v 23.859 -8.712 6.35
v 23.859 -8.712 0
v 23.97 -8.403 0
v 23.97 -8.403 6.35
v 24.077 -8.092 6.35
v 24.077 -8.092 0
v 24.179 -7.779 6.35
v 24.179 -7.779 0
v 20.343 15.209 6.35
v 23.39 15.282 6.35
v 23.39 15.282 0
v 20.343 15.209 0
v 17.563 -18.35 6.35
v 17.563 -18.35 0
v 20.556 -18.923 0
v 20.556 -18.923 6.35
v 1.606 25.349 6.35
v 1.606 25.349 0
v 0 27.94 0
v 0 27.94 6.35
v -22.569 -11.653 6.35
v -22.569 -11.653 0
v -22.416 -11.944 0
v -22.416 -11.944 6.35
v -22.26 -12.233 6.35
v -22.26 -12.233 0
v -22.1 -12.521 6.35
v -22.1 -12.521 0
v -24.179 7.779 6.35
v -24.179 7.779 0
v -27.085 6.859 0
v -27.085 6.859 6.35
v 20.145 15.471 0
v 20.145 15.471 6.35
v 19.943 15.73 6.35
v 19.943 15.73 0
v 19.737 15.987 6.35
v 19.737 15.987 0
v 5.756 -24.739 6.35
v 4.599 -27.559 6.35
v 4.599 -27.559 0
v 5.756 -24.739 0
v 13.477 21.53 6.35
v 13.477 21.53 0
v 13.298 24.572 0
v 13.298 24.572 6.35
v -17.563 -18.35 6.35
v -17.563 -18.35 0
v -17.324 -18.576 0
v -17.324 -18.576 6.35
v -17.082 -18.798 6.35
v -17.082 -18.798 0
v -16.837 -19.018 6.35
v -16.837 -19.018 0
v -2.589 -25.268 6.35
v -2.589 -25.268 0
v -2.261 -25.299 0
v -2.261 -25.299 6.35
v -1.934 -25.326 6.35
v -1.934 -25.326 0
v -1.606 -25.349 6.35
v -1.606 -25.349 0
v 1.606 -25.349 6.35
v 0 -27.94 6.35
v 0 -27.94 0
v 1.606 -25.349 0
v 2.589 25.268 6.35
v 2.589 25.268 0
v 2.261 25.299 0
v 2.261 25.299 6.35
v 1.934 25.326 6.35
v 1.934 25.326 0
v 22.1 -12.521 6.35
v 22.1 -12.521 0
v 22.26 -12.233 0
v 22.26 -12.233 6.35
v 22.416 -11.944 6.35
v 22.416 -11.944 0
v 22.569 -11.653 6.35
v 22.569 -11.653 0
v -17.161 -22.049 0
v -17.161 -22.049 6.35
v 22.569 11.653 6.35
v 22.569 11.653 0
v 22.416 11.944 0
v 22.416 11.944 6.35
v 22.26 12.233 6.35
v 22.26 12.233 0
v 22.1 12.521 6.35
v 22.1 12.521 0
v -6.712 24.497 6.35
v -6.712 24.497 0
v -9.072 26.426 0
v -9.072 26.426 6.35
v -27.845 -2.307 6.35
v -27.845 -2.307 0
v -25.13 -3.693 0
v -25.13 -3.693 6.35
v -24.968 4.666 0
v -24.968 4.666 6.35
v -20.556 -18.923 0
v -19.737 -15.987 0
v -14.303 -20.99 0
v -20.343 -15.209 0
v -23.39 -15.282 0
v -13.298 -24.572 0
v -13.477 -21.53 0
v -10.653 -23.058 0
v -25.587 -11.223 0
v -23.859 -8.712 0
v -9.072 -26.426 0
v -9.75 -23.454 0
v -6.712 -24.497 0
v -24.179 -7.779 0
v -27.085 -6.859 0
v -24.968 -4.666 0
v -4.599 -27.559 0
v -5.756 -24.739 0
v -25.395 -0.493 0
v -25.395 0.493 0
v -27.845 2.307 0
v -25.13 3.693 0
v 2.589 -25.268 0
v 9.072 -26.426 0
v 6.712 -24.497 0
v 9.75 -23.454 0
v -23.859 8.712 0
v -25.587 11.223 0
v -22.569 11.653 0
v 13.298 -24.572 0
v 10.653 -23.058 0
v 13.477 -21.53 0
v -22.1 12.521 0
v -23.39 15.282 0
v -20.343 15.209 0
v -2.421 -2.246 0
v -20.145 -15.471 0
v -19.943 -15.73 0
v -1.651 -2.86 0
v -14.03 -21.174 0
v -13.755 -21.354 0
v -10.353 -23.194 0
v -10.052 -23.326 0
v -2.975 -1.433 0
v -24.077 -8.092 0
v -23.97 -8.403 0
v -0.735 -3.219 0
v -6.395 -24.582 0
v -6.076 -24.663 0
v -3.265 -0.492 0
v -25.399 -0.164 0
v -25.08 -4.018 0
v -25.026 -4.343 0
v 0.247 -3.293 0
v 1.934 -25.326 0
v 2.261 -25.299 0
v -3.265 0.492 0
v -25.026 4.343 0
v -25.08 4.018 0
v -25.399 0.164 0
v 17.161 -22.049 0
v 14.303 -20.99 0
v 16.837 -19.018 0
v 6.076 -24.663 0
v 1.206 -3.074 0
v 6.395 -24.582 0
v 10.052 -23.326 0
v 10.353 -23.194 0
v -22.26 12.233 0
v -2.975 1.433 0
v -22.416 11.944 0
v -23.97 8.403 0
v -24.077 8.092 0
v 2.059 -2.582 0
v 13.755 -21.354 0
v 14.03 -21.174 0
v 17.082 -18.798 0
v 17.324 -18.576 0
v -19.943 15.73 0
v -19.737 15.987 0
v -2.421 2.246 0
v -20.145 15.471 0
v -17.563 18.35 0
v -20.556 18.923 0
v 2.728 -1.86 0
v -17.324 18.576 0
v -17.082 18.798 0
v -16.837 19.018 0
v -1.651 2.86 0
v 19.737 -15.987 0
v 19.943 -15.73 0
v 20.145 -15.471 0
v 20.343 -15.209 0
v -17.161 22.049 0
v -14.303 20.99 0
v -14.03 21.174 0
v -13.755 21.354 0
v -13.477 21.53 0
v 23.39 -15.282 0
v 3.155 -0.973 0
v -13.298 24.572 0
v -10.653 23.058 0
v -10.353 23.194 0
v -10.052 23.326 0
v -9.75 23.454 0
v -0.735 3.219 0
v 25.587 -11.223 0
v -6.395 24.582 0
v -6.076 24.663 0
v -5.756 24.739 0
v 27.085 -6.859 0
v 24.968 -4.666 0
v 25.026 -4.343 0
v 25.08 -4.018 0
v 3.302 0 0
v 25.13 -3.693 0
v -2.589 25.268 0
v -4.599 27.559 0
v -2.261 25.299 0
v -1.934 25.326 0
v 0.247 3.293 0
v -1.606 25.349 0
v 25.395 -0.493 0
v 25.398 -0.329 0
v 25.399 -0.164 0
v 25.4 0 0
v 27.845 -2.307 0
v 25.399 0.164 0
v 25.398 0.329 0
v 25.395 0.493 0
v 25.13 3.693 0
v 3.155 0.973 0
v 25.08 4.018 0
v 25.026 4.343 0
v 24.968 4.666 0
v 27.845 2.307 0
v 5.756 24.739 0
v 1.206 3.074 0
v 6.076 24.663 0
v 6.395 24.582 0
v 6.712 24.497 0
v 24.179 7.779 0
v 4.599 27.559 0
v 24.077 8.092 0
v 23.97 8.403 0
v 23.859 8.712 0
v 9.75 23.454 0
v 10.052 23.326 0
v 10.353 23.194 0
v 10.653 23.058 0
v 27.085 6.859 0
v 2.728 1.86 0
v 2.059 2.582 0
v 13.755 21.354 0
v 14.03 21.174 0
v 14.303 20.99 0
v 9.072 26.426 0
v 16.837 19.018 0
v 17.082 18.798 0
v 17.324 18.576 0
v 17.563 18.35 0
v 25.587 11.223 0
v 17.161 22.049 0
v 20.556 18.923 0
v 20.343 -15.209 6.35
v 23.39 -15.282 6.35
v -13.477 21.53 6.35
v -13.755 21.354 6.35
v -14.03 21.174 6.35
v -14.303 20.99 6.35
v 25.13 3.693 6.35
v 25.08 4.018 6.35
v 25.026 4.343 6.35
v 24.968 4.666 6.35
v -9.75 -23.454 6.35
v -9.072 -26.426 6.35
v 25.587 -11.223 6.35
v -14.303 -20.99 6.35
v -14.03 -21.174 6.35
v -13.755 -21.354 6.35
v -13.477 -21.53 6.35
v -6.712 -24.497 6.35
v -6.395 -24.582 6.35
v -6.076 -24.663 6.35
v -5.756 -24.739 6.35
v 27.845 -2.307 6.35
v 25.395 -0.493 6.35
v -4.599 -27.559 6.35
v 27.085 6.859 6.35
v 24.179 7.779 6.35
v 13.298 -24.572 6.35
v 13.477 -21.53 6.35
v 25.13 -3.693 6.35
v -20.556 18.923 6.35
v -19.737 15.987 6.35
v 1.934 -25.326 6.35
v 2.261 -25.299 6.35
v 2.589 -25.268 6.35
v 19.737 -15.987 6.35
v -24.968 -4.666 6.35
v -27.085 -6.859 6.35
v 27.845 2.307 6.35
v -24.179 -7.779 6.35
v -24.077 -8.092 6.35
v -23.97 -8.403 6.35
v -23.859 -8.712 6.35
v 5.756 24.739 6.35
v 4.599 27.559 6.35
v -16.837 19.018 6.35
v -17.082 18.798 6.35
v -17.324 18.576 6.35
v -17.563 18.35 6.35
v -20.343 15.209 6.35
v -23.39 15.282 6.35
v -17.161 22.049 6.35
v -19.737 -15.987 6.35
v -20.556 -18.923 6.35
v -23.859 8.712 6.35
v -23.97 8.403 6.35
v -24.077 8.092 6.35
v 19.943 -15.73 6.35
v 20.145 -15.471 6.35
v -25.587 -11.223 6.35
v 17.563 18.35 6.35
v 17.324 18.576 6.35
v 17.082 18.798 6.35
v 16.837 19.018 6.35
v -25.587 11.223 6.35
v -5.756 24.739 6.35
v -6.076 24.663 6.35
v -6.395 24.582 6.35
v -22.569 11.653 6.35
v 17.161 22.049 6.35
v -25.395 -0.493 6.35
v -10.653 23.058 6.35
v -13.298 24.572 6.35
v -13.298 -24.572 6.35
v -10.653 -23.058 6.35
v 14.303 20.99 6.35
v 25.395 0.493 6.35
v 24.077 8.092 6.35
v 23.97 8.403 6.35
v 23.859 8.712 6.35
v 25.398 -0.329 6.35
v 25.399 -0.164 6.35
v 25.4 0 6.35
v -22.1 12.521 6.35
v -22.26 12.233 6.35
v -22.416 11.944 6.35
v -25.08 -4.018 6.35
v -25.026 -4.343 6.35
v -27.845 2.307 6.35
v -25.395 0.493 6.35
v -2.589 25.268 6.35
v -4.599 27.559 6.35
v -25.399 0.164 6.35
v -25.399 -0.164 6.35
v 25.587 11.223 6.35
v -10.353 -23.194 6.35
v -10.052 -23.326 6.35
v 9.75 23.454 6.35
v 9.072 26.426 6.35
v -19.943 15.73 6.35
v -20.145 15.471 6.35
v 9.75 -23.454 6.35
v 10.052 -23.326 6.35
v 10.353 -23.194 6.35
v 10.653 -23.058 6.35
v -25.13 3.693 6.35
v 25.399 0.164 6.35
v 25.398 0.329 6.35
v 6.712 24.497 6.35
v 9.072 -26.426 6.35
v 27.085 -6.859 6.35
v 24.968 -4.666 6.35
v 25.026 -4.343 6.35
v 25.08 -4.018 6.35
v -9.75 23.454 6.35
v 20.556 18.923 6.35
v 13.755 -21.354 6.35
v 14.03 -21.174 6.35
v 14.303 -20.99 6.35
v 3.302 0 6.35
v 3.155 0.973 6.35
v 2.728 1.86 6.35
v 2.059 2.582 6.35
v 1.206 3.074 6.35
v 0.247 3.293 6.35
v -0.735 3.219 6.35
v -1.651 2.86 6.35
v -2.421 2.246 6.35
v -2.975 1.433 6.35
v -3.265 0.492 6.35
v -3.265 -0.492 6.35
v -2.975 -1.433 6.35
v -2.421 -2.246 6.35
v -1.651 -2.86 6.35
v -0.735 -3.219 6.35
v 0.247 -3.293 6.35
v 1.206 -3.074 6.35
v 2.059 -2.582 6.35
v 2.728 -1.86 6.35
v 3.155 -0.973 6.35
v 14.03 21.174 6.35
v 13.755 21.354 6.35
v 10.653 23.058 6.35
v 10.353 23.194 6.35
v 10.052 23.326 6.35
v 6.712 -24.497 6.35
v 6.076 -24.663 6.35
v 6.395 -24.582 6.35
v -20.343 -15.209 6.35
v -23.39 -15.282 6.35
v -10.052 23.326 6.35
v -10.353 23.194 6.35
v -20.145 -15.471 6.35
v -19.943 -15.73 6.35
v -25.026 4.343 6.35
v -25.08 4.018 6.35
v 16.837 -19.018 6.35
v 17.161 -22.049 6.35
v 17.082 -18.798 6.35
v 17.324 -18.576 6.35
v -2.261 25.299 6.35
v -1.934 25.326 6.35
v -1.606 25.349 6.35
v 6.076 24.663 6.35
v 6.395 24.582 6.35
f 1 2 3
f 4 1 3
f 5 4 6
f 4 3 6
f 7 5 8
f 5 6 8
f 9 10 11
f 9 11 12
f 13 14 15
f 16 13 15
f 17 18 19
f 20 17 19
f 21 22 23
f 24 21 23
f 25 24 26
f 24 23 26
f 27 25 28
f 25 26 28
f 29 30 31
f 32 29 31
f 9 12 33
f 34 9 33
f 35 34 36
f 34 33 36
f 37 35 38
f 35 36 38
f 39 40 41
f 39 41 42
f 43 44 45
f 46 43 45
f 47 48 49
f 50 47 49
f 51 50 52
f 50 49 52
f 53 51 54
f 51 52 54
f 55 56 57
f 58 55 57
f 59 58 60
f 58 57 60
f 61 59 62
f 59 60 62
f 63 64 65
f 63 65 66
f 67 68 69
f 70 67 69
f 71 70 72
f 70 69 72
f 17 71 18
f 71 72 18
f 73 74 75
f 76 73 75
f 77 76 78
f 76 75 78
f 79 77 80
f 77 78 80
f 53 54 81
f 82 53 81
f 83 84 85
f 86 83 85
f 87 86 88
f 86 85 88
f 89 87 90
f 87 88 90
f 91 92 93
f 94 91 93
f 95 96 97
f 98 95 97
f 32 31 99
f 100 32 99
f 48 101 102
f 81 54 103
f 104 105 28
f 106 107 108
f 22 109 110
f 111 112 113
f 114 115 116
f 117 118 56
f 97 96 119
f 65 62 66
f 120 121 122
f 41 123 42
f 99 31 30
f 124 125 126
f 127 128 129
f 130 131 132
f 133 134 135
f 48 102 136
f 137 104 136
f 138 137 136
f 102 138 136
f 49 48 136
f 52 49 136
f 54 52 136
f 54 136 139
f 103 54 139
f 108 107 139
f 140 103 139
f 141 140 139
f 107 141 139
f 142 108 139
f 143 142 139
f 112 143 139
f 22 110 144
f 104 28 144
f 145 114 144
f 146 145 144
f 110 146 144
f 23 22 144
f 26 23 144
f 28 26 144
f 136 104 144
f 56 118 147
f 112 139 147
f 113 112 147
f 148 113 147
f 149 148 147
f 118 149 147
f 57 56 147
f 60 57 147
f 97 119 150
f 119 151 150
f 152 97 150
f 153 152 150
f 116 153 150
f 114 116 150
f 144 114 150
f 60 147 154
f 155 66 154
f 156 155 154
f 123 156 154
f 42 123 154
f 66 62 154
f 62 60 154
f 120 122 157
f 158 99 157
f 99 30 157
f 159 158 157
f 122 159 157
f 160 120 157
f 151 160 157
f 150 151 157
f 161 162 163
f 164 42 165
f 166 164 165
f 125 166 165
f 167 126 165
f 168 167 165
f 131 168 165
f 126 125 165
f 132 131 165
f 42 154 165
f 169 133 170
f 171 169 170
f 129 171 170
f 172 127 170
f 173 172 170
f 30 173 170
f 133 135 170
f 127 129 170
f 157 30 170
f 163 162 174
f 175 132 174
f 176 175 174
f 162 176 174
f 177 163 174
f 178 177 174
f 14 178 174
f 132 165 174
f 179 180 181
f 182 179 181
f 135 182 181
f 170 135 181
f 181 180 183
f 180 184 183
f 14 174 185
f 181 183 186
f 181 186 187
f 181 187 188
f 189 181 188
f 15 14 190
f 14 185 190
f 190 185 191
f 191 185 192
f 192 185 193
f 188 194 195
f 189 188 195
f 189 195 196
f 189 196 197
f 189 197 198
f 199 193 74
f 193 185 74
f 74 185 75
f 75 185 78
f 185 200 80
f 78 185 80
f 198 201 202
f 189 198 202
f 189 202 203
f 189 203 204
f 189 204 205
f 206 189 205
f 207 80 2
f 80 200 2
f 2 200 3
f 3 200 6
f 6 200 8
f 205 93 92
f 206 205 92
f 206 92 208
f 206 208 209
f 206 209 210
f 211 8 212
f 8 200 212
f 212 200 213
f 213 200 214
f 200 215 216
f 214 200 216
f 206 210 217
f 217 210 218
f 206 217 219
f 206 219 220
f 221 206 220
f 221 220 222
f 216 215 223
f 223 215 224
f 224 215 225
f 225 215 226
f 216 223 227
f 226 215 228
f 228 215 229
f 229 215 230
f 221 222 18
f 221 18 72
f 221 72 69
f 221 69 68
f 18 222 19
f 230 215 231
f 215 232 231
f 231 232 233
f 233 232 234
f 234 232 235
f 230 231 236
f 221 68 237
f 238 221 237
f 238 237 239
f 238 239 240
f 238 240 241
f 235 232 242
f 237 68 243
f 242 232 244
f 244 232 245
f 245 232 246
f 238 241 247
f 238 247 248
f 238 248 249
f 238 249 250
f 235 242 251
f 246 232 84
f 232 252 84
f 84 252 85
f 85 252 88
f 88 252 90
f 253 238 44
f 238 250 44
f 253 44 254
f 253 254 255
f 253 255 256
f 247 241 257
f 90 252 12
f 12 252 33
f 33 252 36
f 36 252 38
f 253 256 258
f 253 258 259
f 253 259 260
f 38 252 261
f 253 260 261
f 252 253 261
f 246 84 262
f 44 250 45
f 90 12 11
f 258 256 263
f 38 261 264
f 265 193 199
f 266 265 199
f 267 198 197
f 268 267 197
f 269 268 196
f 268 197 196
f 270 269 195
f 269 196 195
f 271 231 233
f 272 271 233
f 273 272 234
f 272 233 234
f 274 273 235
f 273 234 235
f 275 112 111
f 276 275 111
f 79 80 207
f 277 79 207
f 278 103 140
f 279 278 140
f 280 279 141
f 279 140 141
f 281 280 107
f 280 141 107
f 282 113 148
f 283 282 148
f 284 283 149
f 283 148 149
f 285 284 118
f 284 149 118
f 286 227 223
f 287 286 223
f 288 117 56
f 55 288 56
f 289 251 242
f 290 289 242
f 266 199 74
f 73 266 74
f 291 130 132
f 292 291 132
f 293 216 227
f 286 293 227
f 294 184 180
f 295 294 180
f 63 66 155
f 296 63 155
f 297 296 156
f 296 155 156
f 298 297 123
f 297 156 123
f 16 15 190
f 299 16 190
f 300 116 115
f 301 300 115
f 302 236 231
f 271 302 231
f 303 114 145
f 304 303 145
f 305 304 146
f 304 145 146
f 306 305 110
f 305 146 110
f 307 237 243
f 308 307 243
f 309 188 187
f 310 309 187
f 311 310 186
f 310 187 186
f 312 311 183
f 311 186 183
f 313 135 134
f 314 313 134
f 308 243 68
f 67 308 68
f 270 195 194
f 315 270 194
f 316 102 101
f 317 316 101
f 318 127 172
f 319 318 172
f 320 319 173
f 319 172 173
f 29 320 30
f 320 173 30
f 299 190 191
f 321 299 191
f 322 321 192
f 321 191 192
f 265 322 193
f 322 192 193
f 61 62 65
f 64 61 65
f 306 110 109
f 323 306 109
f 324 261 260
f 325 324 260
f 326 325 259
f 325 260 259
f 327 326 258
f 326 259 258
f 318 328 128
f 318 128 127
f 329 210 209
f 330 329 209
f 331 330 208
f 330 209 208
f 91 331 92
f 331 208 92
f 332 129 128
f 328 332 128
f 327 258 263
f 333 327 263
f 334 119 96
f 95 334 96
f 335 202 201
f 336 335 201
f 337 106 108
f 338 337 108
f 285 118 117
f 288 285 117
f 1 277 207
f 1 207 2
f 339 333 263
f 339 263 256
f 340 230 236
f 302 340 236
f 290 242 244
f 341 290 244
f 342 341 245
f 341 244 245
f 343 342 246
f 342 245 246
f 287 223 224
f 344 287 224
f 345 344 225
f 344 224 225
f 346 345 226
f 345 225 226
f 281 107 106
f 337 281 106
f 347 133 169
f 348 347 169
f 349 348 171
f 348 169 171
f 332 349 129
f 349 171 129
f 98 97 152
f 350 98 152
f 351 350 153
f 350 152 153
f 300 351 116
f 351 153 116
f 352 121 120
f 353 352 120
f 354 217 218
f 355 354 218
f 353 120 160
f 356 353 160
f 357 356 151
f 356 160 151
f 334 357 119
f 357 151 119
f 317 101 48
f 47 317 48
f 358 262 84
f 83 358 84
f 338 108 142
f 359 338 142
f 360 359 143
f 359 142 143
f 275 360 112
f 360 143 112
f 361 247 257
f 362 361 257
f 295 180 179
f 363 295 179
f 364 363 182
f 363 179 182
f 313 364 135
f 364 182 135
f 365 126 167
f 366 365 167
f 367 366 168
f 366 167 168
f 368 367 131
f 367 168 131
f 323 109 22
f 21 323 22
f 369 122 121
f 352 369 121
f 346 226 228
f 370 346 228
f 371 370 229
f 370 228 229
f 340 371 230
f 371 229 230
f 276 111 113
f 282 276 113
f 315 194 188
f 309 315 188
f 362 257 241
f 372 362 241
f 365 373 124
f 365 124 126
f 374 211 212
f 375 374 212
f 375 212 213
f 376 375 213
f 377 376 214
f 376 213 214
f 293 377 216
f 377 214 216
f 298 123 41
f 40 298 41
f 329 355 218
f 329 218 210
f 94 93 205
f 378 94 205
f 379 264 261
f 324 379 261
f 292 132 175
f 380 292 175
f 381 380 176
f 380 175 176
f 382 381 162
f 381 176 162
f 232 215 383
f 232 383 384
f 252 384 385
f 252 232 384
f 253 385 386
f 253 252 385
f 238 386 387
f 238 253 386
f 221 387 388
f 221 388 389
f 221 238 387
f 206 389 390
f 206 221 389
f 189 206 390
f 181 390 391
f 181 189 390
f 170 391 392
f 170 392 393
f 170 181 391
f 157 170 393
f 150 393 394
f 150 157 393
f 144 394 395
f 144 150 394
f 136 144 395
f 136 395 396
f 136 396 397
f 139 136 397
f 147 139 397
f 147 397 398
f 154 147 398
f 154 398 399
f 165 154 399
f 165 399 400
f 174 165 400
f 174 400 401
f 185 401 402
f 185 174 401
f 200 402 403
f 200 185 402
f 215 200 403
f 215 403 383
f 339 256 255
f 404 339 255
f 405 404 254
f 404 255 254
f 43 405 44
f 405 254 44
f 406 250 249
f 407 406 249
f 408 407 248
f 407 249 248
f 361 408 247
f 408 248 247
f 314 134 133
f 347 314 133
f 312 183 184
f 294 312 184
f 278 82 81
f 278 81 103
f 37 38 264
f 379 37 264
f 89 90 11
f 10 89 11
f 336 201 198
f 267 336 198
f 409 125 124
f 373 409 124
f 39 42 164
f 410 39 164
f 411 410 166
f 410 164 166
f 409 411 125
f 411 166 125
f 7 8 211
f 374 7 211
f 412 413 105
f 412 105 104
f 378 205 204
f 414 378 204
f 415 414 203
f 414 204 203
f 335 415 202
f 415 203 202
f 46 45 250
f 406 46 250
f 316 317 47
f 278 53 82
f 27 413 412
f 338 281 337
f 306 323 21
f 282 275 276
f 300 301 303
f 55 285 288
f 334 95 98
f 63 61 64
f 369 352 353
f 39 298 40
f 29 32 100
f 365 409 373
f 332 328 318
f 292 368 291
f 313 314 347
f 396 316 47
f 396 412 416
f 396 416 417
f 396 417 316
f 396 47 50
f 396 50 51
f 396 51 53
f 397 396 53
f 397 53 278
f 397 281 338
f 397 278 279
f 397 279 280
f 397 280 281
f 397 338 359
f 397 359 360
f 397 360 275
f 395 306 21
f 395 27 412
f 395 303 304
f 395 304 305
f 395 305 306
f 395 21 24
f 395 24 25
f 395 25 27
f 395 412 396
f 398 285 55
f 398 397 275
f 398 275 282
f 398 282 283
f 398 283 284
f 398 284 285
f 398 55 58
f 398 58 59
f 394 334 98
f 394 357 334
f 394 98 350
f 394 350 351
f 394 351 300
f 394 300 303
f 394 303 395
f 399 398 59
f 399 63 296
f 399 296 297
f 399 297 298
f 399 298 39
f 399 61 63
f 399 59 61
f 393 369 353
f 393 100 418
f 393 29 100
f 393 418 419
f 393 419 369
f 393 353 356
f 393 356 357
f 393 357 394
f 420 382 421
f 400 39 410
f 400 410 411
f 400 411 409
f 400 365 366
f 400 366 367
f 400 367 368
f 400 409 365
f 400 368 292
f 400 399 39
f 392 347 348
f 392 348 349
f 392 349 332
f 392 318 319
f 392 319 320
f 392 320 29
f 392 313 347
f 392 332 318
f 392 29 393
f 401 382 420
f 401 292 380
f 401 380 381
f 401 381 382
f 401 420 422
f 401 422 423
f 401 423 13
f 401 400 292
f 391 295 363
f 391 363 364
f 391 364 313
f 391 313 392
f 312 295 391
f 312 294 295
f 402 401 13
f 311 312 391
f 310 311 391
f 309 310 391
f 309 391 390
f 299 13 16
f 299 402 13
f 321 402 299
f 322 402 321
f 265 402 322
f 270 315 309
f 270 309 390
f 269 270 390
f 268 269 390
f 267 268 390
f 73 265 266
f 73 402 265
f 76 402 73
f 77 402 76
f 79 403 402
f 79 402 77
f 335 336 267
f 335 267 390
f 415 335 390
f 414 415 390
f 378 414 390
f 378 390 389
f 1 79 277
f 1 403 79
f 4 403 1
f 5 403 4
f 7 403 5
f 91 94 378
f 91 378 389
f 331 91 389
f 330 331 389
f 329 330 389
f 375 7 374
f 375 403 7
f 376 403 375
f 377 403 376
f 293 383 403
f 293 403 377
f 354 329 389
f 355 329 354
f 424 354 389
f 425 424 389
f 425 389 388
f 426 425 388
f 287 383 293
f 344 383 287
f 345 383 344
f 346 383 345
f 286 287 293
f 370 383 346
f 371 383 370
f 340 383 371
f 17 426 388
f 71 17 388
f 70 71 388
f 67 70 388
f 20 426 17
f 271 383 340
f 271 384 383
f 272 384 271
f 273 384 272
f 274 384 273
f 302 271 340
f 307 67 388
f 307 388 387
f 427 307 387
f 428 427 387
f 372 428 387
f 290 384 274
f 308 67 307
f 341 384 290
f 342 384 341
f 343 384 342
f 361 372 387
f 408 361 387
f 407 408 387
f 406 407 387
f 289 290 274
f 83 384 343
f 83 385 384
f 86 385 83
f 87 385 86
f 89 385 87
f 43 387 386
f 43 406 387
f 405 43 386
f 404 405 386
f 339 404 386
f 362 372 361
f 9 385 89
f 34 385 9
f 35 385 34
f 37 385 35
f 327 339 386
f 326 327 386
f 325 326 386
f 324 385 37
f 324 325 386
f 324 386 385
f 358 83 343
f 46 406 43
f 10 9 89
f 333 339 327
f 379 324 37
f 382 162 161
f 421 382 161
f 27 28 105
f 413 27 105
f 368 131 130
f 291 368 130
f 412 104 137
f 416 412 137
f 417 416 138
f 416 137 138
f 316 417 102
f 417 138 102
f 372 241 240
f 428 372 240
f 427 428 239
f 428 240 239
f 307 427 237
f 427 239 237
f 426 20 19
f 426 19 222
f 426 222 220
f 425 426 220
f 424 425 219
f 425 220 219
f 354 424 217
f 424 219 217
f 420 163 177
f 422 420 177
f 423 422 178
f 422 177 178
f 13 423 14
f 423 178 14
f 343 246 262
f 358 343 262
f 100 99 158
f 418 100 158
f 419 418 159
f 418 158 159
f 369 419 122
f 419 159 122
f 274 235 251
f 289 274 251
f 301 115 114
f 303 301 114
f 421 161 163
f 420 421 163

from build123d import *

# Parameters (mm, degrees)
F0_R     = 3.302
F1_DEPTH = 6.35


with BuildPart() as f1:
    # F0 (on Top) → F1 (new body)
    with BuildSketch(Plane.XY):
        with BuildLine():
            ThreePointArc((2.588606, 25.267749), (4.180703, 25.053577), (5.756076, 24.739191))
            Line((5.756076, 24.739191), (4.598773, 27.558935))
            Line((4.598773, 27.558935), (2.588606, 25.267749))
        make_face()
        with BuildLine():
            ThreePointArc((6.712236, 24.497059), (8.247367, 24.023758), (9.749508, 23.454362))
            Line((9.749508, 23.454362), (9.072103, 26.426134))
            Line((9.072103, 26.426134), (6.712236, 24.497059))
        make_face()
        with BuildLine():
            ThreePointArc((10.652773, 23.058153), (12.089064, 22.338633), (13.476998, 21.529759))
            Line((13.476998, 21.529759), (13.29797, 24.572497))
            Line((13.29797, 24.572497), (10.652773, 23.058153))
        make_face()
        with BuildLine():
            ThreePointArc((14.30273, 20.990281), (15.601003, 20.044169), (16.836871, 19.01788))
            Line((16.836871, 19.01788), (17.161103, 22.048586))
            Line((17.161103, 22.048586), (14.30273, 20.990281))
        make_face()
        with BuildLine():
            ThreePointArc((17.562546, 18.349849), (18.687387, 17.202952), (19.737479, 15.987243))
            Line((19.737479, 15.987243), (20.556126, 18.923247))
            Line((20.556126, 18.923247), (17.562546, 18.349849))
        make_face()
        with BuildLine():
            ThreePointArc((20.343302, 15.208881), (21.264029, 13.892483), (22.099699, 12.520516))
            Line((22.099699, 12.520516), (23.390431, 15.281732))
            Line((23.390431, 15.281732), (20.343302, 15.208881))
        make_face()
        with BuildLine():
            ThreePointArc((22.569146, 11.653054), (23.260642, 10.203064), (23.859097, 8.712261))
            Line((23.859097, 8.712261), (25.586707, 11.22337))
            Line((25.586707, 11.22337), (22.569146, 11.653054))
        make_face()
        with BuildLine():
            ThreePointArc((24.179361, 7.779362), (24.622767, 6.235331), (24.967681, 4.666359))
            Line((24.967681, 4.666359), (27.085043, 6.858865))
            Line((27.085043, 6.858865), (24.179361, 7.779362))
        make_face()
        with BuildLine():
            ThreePointArc((25.130027, 3.69347), (25.313246, 2.097515), (25.395212, 0.493171))
            Line((25.395212, 0.493171), (27.844571, 2.307267))
            Line((27.844571, 2.307267), (25.130027, 3.69347))
        make_face()
        with BuildLine():
            Line((27.844571, -2.307267), (25.395212, -0.493171))
            ThreePointArc((25.395212, -0.493171), (25.313246, -2.097515), (25.130027, -3.69347))
            Line((25.130027, -3.69347), (27.844571, -2.307267))
        make_face()
        with BuildLine():
            Line((27.085043, -6.858865), (24.967681, -4.666359))
            ThreePointArc((24.967681, -4.666359), (24.622767, -6.235331), (24.179361, -7.779362))
            Line((24.179361, -7.779362), (27.085043, -6.858865))
        make_face()
        with BuildLine():
            Line((25.586707, -11.22337), (23.859097, -8.712261))
            ThreePointArc((23.859097, -8.712261), (23.260642, -10.203064), (22.569146, -11.653054))
            Line((22.569146, -11.653054), (25.586707, -11.22337))
        make_face()
        with BuildLine():
            Line((23.390431, -15.281732), (22.099699, -12.520516))
            ThreePointArc((22.099699, -12.520516), (21.264029, -13.892483), (20.343302, -15.208881))
            Line((20.343302, -15.208881), (23.390431, -15.281732))
        make_face()
        with BuildLine():
            Line((20.556126, -18.923247), (19.737479, -15.987243))
            ThreePointArc((19.737479, -15.987243), (18.687387, -17.202952), (17.562546, -18.349849))
            Line((17.562546, -18.349849), (20.556126, -18.923247))
        make_face()
        with BuildLine():
            Line((17.161103, -22.048586), (16.836871, -19.01788))
            ThreePointArc((16.836871, -19.01788), (15.601003, -20.044169), (14.30273, -20.990281))
            Line((14.30273, -20.990281), (17.161103, -22.048586))
        make_face()
        with BuildLine():
            Line((13.29797, -24.572497), (13.476998, -21.529759))
            ThreePointArc((13.476998, -21.529759), (12.089064, -22.338633), (10.652773, -23.058153))
            Line((10.652773, -23.058153), (13.29797, -24.572497))
        make_face()
        with BuildLine():
            Line((9.072103, -26.426134), (9.749508, -23.454362))
            ThreePointArc((9.749508, -23.454362), (8.247367, -24.023758), (6.712236, -24.497059))
            Line((6.712236, -24.497059), (9.072103, -26.426134))
        make_face()
        with BuildLine():
            Line((-27.085043, -6.858865), (-24.179361, -7.779362))
            ThreePointArc((-24.179361, -7.779362), (-24.622767, -6.235331), (-24.967681, -4.666359))
            Line((-24.967681, -4.666359), (-27.085043, -6.858865))
        make_face()
        with BuildLine():
            Line((-25.586707, -11.22337), (-22.569146, -11.653054))
            ThreePointArc((-22.569146, -11.653054), (-23.260642, -10.203064), (-23.859097, -8.712261))
            Line((-23.859097, -8.712261), (-25.586707, -11.22337))
        make_face()
        with BuildLine():
            Line((-23.390431, -15.281732), (-20.343302, -15.208881))
            ThreePointArc((-20.343302, -15.208881), (-21.264029, -13.892483), (-22.099699, -12.520516))
            Line((-22.099699, -12.520516), (-23.390431, -15.281732))
        make_face()
        with BuildLine():
            Line((-20.556126, -18.923247), (-17.562546, -18.349849))
            ThreePointArc((-17.562546, -18.349849), (-18.687387, -17.202952), (-19.737479, -15.987243))
            Line((-19.737479, -15.987243), (-20.556126, -18.923247))
        make_face()
        with BuildLine():
            ThreePointArc((-23.859097, 8.712261), (-23.260642, 10.203064), (-22.569146, 11.653054))
            Line((-22.569146, 11.653054), (-25.586707, 11.22337))
            Line((-25.586707, 11.22337), (-23.859097, 8.712261))
        make_face()
        with BuildLine():
            ThreePointArc((-24.967681, 4.666359), (-24.622767, 6.235331), (-24.179361, 7.779362))
            Line((-24.179361, 7.779362), (-27.085043, 6.858865))
            Line((-27.085043, 6.858865), (-24.967681, 4.666359))
        make_face()
        with BuildLine():
            ThreePointArc((-22.099699, 12.520516), (-21.264029, 13.892483), (-20.343302, 15.208881))
            Line((-20.343302, 15.208881), (-23.390431, 15.281732))
            Line((-23.390431, 15.281732), (-22.099699, 12.520516))
        make_face()
        with BuildLine():
            ThreePointArc((-9.749508, 23.454362), (-8.247367, 24.023758), (-6.712236, 24.497059))
            Line((-6.712236, 24.497059), (-9.072103, 26.426134))
            Line((-9.072103, 26.426134), (-9.749508, 23.454362))
        make_face()
        with BuildLine():
            ThreePointArc((-16.836871, 19.01788), (-15.601003, 20.044169), (-14.30273, 20.990281))
            Line((-14.30273, 20.990281), (-17.161103, 22.048586))
            Line((-17.161103, 22.048586), (-16.836871, 19.01788))
        make_face()
        with BuildLine():
            Line((-17.161103, -22.048586), (-14.30273, -20.990281))
            ThreePointArc((-14.30273, -20.990281), (-15.601003, -20.044169), (-16.836871, -19.01788))
            Line((-16.836871, -19.01788), (-17.161103, -22.048586))
        make_face()
        with BuildLine():
            ThreePointArc((-25.395212, 0.493171), (-25.313246, 2.097515), (-25.130027, 3.69347))
            Line((-25.130027, 3.69347), (-27.844571, 2.307267))
            Line((-27.844571, 2.307267), (-25.395212, 0.493171))
        make_face()
        with BuildLine():
            Line((-13.29797, -24.572497), (-10.652773, -23.058153))
            ThreePointArc((-10.652773, -23.058153), (-12.089064, -22.338633), (-13.476998, -21.529759))
            Line((-13.476998, -21.529759), (-13.29797, -24.572497))
        make_face()
        with BuildLine():
            Line((-27.844571, -2.307267), (-25.130027, -3.69347))
            ThreePointArc((-25.130027, -3.69347), (-25.313246, -2.097515), (-25.395212, -0.493171))
            Line((-25.395212, -0.493171), (-27.844571, -2.307267))
        make_face()
        with BuildLine():
            Line((-4.598773, -27.558935), (-2.588606, -25.267749))
            ThreePointArc((-2.588606, -25.267749), (-4.180703, -25.053577), (-5.756076, -24.739191))
            Line((-5.756076, -24.739191), (-4.598773, -27.558935))
        make_face()
        with BuildLine():
            Line((0, -27.94), (1.605634, -25.3492))
            ThreePointArc((1.605634, -25.3492), (0, -25.4), (-1.605634, -25.3492))
            Line((-1.605634, -25.3492), (0, -27.94))
        make_face()
        with BuildLine():
            Line((4.598773, -27.558935), (5.756076, -24.739191))
            ThreePointArc((5.756076, -24.739191), (4.180703, -25.053577), (2.588606, -25.267749))
            Line((2.588606, -25.267749), (4.598773, -27.558935))
        make_face()
        with BuildLine():
            ThreePointArc((-19.737479, 15.987243), (-18.687387, 17.202952), (-17.562546, 18.349849))
            Line((-17.562546, 18.349849), (-20.556126, 18.923247))
            Line((-20.556126, 18.923247), (-19.737479, 15.987243))
        make_face()
        with BuildLine():
            ThreePointArc((-5.756076, 24.739191), (-4.180703, 25.053577), (-2.588606, 25.267749))
            Line((-2.588606, 25.267749), (-4.598773, 27.558935))
            Line((-4.598773, 27.558935), (-5.756076, 24.739191))
        make_face()
        with BuildLine():
            ThreePointArc((-13.476998, 21.529759), (-12.089064, 22.338633), (-10.652773, 23.058153))
            Line((-10.652773, 23.058153), (-13.29797, 24.572497))
            Line((-13.29797, 24.572497), (-13.476998, 21.529759))
        make_face()
        with BuildLine():
            Line((-9.072103, -26.426134), (-6.712236, -24.497059))
            ThreePointArc((-6.712236, -24.497059), (-8.247367, -24.023758), (-9.749508, -23.454362))
            Line((-9.749508, -23.454362), (-9.072103, -26.426134))
        make_face()
        with BuildLine():
            ThreePointArc((0, 25.4), (0.803219, 25.387297), (1.605634, 25.3492))
            Line((1.605634, 25.3492), (0, 27.94))
            Line((0, 27.94), (0, 25.4))
        make_face()
        with BuildLine():
            ThreePointArc((-1.605634, 25.3492), (-0.803219, 25.387297), (0, 25.4))
            Line((0, 25.4), (0, 27.94))
            Line((0, 27.94), (-1.605634, 25.3492))
        make_face()
        with BuildLine():
            ThreePointArc((25.395212, -0.493171), (25.398803, -0.246597), (25.4, 0))
            ThreePointArc((25.4, 0), (25.398803, 0.246597), (25.395212, 0.493171))
            ThreePointArc((25.395212, 0.493171), (25.313246, 2.097515), (25.130027, 3.69347))
            ThreePointArc((25.130027, 3.69347), (25.053577, 4.180703), (24.967681, 4.666359))
            ThreePointArc((24.967681, 4.666359), (24.622767, 6.235331), (24.179361, 7.779362))
            ThreePointArc((24.179361, 7.779362), (24.023758, 8.247367), (23.859097, 8.712261))
            ThreePointArc((23.859097, 8.712261), (23.260642, 10.203064), (22.569146, 11.653054))
            ThreePointArc((22.569146, 11.653054), (22.338633, 12.089064), (22.099699, 12.520516))
            ThreePointArc((22.099699, 12.520516), (21.264029, 13.892483), (20.343302, 15.208881))
            ThreePointArc((20.343302, 15.208881), (20.044169, 15.601003), (19.737479, 15.987243))
            ThreePointArc((19.737479, 15.987243), (18.687387, 17.202952), (17.562546, 18.349849))
            ThreePointArc((17.562546, 18.349849), (17.202952, 18.687387), (16.836871, 19.01788))
            ThreePointArc((16.836871, 19.01788), (15.601003, 20.044169), (14.30273, 20.990281))
            ThreePointArc((14.30273, 20.990281), (13.892483, 21.264029), (13.476998, 21.529759))
            ThreePointArc((13.476998, 21.529759), (12.089064, 22.338633), (10.652773, 23.058153))
            ThreePointArc((10.652773, 23.058153), (10.203064, 23.260642), (9.749508, 23.454362))
            ThreePointArc((9.749508, 23.454362), (8.247367, 24.023758), (6.712236, 24.497059))
            ThreePointArc((6.712236, 24.497059), (6.235331, 24.622767), (5.756076, 24.739191))
            ThreePointArc((5.756076, 24.739191), (4.180703, 25.053577), (2.588606, 25.267749))
            ThreePointArc((2.588606, 25.267749), (2.097515, 25.313246), (1.605634, 25.3492))
            ThreePointArc((1.605634, 25.3492), (0.803219, 25.387297), (0, 25.4))
            ThreePointArc((0, 25.4), (-0.803219, 25.387297), (-1.605634, 25.3492))
            ThreePointArc((-1.605634, 25.3492), (-2.097515, 25.313246), (-2.588606, 25.267749))
            ThreePointArc((-2.588606, 25.267749), (-4.180703, 25.053577), (-5.756076, 24.739191))
            ThreePointArc((-5.756076, 24.739191), (-6.235331, 24.622767), (-6.712236, 24.497059))
            ThreePointArc((-6.712236, 24.497059), (-8.247367, 24.023758), (-9.749508, 23.454362))
            ThreePointArc((-9.749508, 23.454362), (-10.203064, 23.260642), (-10.652773, 23.058153))
            ThreePointArc((-10.652773, 23.058153), (-12.089064, 22.338633), (-13.476998, 21.529759))
            ThreePointArc((-13.476998, 21.529759), (-13.892483, 21.264029), (-14.30273, 20.990281))
            ThreePointArc((-14.30273, 20.990281), (-15.601003, 20.044169), (-16.836871, 19.01788))
            ThreePointArc((-16.836871, 19.01788), (-17.202952, 18.687387), (-17.562546, 18.349849))
            ThreePointArc((-17.562546, 18.349849), (-18.687387, 17.202952), (-19.737479, 15.987243))
            ThreePointArc((-19.737479, 15.987243), (-20.044169, 15.601003), (-20.343302, 15.208881))
            ThreePointArc((-20.343302, 15.208881), (-21.264029, 13.892483), (-22.099699, 12.520516))
            ThreePointArc((-22.099699, 12.520516), (-22.338633, 12.089064), (-22.569146, 11.653054))
            ThreePointArc((-22.569146, 11.653054), (-23.260642, 10.203064), (-23.859097, 8.712261))
            ThreePointArc((-23.859097, 8.712261), (-24.023758, 8.247367), (-24.179361, 7.779362))
            ThreePointArc((-24.179361, 7.779362), (-24.622767, 6.235331), (-24.967681, 4.666359))
            ThreePointArc((-24.967681, 4.666359), (-25.053577, 4.180703), (-25.130027, 3.69347))
            ThreePointArc((-25.130027, 3.69347), (-25.313246, 2.097515), (-25.395212, 0.493171))
            ThreePointArc((-25.395212, 0.493171), (-25.4, 0), (-25.395212, -0.493171))
            ThreePointArc((-25.395212, -0.493171), (-25.313246, -2.097515), (-25.130027, -3.69347))
            ThreePointArc((-25.130027, -3.69347), (-25.053577, -4.180703), (-24.967681, -4.666359))
            ThreePointArc((-24.967681, -4.666359), (-24.622767, -6.235331), (-24.179361, -7.779362))
            ThreePointArc((-24.179361, -7.779362), (-24.023758, -8.247367), (-23.859097, -8.712261))
            ThreePointArc((-23.859097, -8.712261), (-23.260642, -10.203064), (-22.569146, -11.653054))
            ThreePointArc((-22.569146, -11.653054), (-22.338633, -12.089064), (-22.099699, -12.520516))
            ThreePointArc((-22.099699, -12.520516), (-21.264029, -13.892483), (-20.343302, -15.208881))
            ThreePointArc((-20.343302, -15.208881), (-20.044169, -15.601003), (-19.737479, -15.987243))
            ThreePointArc((-19.737479, -15.987243), (-18.687387, -17.202952), (-17.562546, -18.349849))
            ThreePointArc((-17.562546, -18.349849), (-17.202952, -18.687387), (-16.836871, -19.01788))
            ThreePointArc((-16.836871, -19.01788), (-15.601003, -20.044169), (-14.30273, -20.990281))
            ThreePointArc((-14.30273, -20.990281), (-13.892483, -21.264029), (-13.476998, -21.529759))
            ThreePointArc((-13.476998, -21.529759), (-12.089064, -22.338633), (-10.652773, -23.058153))
            ThreePointArc((-10.652773, -23.058153), (-10.203064, -23.260642), (-9.749508, -23.454362))
            ThreePointArc((-9.749508, -23.454362), (-8.247367, -24.023758), (-6.712236, -24.497059))
            ThreePointArc((-6.712236, -24.497059), (-6.235331, -24.622767), (-5.756076, -24.739191))
            ThreePointArc((-5.756076, -24.739191), (-4.180703, -25.053577), (-2.588606, -25.267749))
            ThreePointArc((-2.588606, -25.267749), (-2.097515, -25.313246), (-1.605634, -25.3492))
            ThreePointArc((-1.605634, -25.3492), (0, -25.4), (1.605634, -25.3492))
            ThreePointArc((1.605634, -25.3492), (2.097515, -25.313246), (2.588606, -25.267749))
            ThreePointArc((2.588606, -25.267749), (4.180703, -25.053577), (5.756076, -24.739191))
            ThreePointArc((5.756076, -24.739191), (6.235331, -24.622767), (6.712236, -24.497059))
            ThreePointArc((6.712236, -24.497059), (8.247367, -24.023758), (9.749508, -23.454362))
            ThreePointArc((9.749508, -23.454362), (10.203064, -23.260642), (10.652773, -23.058153))
            ThreePointArc((10.652773, -23.058153), (12.089064, -22.338633), (13.476998, -21.529759))
            ThreePointArc((13.476998, -21.529759), (13.892483, -21.264029), (14.30273, -20.990281))
            ThreePointArc((14.30273, -20.990281), (15.601003, -20.044169), (16.836871, -19.01788))
            ThreePointArc((16.836871, -19.01788), (17.202952, -18.687387), (17.562546, -18.349849))
            ThreePointArc((17.562546, -18.349849), (18.687387, -17.202952), (19.737479, -15.987243))
            ThreePointArc((19.737479, -15.987243), (20.044169, -15.601003), (20.343302, -15.208881))
            ThreePointArc((20.343302, -15.208881), (21.264029, -13.892483), (22.099699, -12.520516))
            ThreePointArc((22.099699, -12.520516), (22.338633, -12.089064), (22.569146, -11.653054))
            ThreePointArc((22.569146, -11.653054), (23.260642, -10.203064), (23.859097, -8.712261))
            ThreePointArc((23.859097, -8.712261), (24.023758, -8.247367), (24.179361, -7.779362))
            ThreePointArc((24.179361, -7.779362), (24.622767, -6.235331), (24.967681, -4.666359))
            ThreePointArc((24.967681, -4.666359), (25.053577, -4.180703), (25.130027, -3.69347))
            ThreePointArc((25.130027, -3.69347), (25.313246, -2.097515), (25.395212, -0.493171))
        make_face()
        Circle(F0_R, mode=Mode.SUBTRACT)
    extrude(amount=F1_DEPTH)


solid = f1.part
